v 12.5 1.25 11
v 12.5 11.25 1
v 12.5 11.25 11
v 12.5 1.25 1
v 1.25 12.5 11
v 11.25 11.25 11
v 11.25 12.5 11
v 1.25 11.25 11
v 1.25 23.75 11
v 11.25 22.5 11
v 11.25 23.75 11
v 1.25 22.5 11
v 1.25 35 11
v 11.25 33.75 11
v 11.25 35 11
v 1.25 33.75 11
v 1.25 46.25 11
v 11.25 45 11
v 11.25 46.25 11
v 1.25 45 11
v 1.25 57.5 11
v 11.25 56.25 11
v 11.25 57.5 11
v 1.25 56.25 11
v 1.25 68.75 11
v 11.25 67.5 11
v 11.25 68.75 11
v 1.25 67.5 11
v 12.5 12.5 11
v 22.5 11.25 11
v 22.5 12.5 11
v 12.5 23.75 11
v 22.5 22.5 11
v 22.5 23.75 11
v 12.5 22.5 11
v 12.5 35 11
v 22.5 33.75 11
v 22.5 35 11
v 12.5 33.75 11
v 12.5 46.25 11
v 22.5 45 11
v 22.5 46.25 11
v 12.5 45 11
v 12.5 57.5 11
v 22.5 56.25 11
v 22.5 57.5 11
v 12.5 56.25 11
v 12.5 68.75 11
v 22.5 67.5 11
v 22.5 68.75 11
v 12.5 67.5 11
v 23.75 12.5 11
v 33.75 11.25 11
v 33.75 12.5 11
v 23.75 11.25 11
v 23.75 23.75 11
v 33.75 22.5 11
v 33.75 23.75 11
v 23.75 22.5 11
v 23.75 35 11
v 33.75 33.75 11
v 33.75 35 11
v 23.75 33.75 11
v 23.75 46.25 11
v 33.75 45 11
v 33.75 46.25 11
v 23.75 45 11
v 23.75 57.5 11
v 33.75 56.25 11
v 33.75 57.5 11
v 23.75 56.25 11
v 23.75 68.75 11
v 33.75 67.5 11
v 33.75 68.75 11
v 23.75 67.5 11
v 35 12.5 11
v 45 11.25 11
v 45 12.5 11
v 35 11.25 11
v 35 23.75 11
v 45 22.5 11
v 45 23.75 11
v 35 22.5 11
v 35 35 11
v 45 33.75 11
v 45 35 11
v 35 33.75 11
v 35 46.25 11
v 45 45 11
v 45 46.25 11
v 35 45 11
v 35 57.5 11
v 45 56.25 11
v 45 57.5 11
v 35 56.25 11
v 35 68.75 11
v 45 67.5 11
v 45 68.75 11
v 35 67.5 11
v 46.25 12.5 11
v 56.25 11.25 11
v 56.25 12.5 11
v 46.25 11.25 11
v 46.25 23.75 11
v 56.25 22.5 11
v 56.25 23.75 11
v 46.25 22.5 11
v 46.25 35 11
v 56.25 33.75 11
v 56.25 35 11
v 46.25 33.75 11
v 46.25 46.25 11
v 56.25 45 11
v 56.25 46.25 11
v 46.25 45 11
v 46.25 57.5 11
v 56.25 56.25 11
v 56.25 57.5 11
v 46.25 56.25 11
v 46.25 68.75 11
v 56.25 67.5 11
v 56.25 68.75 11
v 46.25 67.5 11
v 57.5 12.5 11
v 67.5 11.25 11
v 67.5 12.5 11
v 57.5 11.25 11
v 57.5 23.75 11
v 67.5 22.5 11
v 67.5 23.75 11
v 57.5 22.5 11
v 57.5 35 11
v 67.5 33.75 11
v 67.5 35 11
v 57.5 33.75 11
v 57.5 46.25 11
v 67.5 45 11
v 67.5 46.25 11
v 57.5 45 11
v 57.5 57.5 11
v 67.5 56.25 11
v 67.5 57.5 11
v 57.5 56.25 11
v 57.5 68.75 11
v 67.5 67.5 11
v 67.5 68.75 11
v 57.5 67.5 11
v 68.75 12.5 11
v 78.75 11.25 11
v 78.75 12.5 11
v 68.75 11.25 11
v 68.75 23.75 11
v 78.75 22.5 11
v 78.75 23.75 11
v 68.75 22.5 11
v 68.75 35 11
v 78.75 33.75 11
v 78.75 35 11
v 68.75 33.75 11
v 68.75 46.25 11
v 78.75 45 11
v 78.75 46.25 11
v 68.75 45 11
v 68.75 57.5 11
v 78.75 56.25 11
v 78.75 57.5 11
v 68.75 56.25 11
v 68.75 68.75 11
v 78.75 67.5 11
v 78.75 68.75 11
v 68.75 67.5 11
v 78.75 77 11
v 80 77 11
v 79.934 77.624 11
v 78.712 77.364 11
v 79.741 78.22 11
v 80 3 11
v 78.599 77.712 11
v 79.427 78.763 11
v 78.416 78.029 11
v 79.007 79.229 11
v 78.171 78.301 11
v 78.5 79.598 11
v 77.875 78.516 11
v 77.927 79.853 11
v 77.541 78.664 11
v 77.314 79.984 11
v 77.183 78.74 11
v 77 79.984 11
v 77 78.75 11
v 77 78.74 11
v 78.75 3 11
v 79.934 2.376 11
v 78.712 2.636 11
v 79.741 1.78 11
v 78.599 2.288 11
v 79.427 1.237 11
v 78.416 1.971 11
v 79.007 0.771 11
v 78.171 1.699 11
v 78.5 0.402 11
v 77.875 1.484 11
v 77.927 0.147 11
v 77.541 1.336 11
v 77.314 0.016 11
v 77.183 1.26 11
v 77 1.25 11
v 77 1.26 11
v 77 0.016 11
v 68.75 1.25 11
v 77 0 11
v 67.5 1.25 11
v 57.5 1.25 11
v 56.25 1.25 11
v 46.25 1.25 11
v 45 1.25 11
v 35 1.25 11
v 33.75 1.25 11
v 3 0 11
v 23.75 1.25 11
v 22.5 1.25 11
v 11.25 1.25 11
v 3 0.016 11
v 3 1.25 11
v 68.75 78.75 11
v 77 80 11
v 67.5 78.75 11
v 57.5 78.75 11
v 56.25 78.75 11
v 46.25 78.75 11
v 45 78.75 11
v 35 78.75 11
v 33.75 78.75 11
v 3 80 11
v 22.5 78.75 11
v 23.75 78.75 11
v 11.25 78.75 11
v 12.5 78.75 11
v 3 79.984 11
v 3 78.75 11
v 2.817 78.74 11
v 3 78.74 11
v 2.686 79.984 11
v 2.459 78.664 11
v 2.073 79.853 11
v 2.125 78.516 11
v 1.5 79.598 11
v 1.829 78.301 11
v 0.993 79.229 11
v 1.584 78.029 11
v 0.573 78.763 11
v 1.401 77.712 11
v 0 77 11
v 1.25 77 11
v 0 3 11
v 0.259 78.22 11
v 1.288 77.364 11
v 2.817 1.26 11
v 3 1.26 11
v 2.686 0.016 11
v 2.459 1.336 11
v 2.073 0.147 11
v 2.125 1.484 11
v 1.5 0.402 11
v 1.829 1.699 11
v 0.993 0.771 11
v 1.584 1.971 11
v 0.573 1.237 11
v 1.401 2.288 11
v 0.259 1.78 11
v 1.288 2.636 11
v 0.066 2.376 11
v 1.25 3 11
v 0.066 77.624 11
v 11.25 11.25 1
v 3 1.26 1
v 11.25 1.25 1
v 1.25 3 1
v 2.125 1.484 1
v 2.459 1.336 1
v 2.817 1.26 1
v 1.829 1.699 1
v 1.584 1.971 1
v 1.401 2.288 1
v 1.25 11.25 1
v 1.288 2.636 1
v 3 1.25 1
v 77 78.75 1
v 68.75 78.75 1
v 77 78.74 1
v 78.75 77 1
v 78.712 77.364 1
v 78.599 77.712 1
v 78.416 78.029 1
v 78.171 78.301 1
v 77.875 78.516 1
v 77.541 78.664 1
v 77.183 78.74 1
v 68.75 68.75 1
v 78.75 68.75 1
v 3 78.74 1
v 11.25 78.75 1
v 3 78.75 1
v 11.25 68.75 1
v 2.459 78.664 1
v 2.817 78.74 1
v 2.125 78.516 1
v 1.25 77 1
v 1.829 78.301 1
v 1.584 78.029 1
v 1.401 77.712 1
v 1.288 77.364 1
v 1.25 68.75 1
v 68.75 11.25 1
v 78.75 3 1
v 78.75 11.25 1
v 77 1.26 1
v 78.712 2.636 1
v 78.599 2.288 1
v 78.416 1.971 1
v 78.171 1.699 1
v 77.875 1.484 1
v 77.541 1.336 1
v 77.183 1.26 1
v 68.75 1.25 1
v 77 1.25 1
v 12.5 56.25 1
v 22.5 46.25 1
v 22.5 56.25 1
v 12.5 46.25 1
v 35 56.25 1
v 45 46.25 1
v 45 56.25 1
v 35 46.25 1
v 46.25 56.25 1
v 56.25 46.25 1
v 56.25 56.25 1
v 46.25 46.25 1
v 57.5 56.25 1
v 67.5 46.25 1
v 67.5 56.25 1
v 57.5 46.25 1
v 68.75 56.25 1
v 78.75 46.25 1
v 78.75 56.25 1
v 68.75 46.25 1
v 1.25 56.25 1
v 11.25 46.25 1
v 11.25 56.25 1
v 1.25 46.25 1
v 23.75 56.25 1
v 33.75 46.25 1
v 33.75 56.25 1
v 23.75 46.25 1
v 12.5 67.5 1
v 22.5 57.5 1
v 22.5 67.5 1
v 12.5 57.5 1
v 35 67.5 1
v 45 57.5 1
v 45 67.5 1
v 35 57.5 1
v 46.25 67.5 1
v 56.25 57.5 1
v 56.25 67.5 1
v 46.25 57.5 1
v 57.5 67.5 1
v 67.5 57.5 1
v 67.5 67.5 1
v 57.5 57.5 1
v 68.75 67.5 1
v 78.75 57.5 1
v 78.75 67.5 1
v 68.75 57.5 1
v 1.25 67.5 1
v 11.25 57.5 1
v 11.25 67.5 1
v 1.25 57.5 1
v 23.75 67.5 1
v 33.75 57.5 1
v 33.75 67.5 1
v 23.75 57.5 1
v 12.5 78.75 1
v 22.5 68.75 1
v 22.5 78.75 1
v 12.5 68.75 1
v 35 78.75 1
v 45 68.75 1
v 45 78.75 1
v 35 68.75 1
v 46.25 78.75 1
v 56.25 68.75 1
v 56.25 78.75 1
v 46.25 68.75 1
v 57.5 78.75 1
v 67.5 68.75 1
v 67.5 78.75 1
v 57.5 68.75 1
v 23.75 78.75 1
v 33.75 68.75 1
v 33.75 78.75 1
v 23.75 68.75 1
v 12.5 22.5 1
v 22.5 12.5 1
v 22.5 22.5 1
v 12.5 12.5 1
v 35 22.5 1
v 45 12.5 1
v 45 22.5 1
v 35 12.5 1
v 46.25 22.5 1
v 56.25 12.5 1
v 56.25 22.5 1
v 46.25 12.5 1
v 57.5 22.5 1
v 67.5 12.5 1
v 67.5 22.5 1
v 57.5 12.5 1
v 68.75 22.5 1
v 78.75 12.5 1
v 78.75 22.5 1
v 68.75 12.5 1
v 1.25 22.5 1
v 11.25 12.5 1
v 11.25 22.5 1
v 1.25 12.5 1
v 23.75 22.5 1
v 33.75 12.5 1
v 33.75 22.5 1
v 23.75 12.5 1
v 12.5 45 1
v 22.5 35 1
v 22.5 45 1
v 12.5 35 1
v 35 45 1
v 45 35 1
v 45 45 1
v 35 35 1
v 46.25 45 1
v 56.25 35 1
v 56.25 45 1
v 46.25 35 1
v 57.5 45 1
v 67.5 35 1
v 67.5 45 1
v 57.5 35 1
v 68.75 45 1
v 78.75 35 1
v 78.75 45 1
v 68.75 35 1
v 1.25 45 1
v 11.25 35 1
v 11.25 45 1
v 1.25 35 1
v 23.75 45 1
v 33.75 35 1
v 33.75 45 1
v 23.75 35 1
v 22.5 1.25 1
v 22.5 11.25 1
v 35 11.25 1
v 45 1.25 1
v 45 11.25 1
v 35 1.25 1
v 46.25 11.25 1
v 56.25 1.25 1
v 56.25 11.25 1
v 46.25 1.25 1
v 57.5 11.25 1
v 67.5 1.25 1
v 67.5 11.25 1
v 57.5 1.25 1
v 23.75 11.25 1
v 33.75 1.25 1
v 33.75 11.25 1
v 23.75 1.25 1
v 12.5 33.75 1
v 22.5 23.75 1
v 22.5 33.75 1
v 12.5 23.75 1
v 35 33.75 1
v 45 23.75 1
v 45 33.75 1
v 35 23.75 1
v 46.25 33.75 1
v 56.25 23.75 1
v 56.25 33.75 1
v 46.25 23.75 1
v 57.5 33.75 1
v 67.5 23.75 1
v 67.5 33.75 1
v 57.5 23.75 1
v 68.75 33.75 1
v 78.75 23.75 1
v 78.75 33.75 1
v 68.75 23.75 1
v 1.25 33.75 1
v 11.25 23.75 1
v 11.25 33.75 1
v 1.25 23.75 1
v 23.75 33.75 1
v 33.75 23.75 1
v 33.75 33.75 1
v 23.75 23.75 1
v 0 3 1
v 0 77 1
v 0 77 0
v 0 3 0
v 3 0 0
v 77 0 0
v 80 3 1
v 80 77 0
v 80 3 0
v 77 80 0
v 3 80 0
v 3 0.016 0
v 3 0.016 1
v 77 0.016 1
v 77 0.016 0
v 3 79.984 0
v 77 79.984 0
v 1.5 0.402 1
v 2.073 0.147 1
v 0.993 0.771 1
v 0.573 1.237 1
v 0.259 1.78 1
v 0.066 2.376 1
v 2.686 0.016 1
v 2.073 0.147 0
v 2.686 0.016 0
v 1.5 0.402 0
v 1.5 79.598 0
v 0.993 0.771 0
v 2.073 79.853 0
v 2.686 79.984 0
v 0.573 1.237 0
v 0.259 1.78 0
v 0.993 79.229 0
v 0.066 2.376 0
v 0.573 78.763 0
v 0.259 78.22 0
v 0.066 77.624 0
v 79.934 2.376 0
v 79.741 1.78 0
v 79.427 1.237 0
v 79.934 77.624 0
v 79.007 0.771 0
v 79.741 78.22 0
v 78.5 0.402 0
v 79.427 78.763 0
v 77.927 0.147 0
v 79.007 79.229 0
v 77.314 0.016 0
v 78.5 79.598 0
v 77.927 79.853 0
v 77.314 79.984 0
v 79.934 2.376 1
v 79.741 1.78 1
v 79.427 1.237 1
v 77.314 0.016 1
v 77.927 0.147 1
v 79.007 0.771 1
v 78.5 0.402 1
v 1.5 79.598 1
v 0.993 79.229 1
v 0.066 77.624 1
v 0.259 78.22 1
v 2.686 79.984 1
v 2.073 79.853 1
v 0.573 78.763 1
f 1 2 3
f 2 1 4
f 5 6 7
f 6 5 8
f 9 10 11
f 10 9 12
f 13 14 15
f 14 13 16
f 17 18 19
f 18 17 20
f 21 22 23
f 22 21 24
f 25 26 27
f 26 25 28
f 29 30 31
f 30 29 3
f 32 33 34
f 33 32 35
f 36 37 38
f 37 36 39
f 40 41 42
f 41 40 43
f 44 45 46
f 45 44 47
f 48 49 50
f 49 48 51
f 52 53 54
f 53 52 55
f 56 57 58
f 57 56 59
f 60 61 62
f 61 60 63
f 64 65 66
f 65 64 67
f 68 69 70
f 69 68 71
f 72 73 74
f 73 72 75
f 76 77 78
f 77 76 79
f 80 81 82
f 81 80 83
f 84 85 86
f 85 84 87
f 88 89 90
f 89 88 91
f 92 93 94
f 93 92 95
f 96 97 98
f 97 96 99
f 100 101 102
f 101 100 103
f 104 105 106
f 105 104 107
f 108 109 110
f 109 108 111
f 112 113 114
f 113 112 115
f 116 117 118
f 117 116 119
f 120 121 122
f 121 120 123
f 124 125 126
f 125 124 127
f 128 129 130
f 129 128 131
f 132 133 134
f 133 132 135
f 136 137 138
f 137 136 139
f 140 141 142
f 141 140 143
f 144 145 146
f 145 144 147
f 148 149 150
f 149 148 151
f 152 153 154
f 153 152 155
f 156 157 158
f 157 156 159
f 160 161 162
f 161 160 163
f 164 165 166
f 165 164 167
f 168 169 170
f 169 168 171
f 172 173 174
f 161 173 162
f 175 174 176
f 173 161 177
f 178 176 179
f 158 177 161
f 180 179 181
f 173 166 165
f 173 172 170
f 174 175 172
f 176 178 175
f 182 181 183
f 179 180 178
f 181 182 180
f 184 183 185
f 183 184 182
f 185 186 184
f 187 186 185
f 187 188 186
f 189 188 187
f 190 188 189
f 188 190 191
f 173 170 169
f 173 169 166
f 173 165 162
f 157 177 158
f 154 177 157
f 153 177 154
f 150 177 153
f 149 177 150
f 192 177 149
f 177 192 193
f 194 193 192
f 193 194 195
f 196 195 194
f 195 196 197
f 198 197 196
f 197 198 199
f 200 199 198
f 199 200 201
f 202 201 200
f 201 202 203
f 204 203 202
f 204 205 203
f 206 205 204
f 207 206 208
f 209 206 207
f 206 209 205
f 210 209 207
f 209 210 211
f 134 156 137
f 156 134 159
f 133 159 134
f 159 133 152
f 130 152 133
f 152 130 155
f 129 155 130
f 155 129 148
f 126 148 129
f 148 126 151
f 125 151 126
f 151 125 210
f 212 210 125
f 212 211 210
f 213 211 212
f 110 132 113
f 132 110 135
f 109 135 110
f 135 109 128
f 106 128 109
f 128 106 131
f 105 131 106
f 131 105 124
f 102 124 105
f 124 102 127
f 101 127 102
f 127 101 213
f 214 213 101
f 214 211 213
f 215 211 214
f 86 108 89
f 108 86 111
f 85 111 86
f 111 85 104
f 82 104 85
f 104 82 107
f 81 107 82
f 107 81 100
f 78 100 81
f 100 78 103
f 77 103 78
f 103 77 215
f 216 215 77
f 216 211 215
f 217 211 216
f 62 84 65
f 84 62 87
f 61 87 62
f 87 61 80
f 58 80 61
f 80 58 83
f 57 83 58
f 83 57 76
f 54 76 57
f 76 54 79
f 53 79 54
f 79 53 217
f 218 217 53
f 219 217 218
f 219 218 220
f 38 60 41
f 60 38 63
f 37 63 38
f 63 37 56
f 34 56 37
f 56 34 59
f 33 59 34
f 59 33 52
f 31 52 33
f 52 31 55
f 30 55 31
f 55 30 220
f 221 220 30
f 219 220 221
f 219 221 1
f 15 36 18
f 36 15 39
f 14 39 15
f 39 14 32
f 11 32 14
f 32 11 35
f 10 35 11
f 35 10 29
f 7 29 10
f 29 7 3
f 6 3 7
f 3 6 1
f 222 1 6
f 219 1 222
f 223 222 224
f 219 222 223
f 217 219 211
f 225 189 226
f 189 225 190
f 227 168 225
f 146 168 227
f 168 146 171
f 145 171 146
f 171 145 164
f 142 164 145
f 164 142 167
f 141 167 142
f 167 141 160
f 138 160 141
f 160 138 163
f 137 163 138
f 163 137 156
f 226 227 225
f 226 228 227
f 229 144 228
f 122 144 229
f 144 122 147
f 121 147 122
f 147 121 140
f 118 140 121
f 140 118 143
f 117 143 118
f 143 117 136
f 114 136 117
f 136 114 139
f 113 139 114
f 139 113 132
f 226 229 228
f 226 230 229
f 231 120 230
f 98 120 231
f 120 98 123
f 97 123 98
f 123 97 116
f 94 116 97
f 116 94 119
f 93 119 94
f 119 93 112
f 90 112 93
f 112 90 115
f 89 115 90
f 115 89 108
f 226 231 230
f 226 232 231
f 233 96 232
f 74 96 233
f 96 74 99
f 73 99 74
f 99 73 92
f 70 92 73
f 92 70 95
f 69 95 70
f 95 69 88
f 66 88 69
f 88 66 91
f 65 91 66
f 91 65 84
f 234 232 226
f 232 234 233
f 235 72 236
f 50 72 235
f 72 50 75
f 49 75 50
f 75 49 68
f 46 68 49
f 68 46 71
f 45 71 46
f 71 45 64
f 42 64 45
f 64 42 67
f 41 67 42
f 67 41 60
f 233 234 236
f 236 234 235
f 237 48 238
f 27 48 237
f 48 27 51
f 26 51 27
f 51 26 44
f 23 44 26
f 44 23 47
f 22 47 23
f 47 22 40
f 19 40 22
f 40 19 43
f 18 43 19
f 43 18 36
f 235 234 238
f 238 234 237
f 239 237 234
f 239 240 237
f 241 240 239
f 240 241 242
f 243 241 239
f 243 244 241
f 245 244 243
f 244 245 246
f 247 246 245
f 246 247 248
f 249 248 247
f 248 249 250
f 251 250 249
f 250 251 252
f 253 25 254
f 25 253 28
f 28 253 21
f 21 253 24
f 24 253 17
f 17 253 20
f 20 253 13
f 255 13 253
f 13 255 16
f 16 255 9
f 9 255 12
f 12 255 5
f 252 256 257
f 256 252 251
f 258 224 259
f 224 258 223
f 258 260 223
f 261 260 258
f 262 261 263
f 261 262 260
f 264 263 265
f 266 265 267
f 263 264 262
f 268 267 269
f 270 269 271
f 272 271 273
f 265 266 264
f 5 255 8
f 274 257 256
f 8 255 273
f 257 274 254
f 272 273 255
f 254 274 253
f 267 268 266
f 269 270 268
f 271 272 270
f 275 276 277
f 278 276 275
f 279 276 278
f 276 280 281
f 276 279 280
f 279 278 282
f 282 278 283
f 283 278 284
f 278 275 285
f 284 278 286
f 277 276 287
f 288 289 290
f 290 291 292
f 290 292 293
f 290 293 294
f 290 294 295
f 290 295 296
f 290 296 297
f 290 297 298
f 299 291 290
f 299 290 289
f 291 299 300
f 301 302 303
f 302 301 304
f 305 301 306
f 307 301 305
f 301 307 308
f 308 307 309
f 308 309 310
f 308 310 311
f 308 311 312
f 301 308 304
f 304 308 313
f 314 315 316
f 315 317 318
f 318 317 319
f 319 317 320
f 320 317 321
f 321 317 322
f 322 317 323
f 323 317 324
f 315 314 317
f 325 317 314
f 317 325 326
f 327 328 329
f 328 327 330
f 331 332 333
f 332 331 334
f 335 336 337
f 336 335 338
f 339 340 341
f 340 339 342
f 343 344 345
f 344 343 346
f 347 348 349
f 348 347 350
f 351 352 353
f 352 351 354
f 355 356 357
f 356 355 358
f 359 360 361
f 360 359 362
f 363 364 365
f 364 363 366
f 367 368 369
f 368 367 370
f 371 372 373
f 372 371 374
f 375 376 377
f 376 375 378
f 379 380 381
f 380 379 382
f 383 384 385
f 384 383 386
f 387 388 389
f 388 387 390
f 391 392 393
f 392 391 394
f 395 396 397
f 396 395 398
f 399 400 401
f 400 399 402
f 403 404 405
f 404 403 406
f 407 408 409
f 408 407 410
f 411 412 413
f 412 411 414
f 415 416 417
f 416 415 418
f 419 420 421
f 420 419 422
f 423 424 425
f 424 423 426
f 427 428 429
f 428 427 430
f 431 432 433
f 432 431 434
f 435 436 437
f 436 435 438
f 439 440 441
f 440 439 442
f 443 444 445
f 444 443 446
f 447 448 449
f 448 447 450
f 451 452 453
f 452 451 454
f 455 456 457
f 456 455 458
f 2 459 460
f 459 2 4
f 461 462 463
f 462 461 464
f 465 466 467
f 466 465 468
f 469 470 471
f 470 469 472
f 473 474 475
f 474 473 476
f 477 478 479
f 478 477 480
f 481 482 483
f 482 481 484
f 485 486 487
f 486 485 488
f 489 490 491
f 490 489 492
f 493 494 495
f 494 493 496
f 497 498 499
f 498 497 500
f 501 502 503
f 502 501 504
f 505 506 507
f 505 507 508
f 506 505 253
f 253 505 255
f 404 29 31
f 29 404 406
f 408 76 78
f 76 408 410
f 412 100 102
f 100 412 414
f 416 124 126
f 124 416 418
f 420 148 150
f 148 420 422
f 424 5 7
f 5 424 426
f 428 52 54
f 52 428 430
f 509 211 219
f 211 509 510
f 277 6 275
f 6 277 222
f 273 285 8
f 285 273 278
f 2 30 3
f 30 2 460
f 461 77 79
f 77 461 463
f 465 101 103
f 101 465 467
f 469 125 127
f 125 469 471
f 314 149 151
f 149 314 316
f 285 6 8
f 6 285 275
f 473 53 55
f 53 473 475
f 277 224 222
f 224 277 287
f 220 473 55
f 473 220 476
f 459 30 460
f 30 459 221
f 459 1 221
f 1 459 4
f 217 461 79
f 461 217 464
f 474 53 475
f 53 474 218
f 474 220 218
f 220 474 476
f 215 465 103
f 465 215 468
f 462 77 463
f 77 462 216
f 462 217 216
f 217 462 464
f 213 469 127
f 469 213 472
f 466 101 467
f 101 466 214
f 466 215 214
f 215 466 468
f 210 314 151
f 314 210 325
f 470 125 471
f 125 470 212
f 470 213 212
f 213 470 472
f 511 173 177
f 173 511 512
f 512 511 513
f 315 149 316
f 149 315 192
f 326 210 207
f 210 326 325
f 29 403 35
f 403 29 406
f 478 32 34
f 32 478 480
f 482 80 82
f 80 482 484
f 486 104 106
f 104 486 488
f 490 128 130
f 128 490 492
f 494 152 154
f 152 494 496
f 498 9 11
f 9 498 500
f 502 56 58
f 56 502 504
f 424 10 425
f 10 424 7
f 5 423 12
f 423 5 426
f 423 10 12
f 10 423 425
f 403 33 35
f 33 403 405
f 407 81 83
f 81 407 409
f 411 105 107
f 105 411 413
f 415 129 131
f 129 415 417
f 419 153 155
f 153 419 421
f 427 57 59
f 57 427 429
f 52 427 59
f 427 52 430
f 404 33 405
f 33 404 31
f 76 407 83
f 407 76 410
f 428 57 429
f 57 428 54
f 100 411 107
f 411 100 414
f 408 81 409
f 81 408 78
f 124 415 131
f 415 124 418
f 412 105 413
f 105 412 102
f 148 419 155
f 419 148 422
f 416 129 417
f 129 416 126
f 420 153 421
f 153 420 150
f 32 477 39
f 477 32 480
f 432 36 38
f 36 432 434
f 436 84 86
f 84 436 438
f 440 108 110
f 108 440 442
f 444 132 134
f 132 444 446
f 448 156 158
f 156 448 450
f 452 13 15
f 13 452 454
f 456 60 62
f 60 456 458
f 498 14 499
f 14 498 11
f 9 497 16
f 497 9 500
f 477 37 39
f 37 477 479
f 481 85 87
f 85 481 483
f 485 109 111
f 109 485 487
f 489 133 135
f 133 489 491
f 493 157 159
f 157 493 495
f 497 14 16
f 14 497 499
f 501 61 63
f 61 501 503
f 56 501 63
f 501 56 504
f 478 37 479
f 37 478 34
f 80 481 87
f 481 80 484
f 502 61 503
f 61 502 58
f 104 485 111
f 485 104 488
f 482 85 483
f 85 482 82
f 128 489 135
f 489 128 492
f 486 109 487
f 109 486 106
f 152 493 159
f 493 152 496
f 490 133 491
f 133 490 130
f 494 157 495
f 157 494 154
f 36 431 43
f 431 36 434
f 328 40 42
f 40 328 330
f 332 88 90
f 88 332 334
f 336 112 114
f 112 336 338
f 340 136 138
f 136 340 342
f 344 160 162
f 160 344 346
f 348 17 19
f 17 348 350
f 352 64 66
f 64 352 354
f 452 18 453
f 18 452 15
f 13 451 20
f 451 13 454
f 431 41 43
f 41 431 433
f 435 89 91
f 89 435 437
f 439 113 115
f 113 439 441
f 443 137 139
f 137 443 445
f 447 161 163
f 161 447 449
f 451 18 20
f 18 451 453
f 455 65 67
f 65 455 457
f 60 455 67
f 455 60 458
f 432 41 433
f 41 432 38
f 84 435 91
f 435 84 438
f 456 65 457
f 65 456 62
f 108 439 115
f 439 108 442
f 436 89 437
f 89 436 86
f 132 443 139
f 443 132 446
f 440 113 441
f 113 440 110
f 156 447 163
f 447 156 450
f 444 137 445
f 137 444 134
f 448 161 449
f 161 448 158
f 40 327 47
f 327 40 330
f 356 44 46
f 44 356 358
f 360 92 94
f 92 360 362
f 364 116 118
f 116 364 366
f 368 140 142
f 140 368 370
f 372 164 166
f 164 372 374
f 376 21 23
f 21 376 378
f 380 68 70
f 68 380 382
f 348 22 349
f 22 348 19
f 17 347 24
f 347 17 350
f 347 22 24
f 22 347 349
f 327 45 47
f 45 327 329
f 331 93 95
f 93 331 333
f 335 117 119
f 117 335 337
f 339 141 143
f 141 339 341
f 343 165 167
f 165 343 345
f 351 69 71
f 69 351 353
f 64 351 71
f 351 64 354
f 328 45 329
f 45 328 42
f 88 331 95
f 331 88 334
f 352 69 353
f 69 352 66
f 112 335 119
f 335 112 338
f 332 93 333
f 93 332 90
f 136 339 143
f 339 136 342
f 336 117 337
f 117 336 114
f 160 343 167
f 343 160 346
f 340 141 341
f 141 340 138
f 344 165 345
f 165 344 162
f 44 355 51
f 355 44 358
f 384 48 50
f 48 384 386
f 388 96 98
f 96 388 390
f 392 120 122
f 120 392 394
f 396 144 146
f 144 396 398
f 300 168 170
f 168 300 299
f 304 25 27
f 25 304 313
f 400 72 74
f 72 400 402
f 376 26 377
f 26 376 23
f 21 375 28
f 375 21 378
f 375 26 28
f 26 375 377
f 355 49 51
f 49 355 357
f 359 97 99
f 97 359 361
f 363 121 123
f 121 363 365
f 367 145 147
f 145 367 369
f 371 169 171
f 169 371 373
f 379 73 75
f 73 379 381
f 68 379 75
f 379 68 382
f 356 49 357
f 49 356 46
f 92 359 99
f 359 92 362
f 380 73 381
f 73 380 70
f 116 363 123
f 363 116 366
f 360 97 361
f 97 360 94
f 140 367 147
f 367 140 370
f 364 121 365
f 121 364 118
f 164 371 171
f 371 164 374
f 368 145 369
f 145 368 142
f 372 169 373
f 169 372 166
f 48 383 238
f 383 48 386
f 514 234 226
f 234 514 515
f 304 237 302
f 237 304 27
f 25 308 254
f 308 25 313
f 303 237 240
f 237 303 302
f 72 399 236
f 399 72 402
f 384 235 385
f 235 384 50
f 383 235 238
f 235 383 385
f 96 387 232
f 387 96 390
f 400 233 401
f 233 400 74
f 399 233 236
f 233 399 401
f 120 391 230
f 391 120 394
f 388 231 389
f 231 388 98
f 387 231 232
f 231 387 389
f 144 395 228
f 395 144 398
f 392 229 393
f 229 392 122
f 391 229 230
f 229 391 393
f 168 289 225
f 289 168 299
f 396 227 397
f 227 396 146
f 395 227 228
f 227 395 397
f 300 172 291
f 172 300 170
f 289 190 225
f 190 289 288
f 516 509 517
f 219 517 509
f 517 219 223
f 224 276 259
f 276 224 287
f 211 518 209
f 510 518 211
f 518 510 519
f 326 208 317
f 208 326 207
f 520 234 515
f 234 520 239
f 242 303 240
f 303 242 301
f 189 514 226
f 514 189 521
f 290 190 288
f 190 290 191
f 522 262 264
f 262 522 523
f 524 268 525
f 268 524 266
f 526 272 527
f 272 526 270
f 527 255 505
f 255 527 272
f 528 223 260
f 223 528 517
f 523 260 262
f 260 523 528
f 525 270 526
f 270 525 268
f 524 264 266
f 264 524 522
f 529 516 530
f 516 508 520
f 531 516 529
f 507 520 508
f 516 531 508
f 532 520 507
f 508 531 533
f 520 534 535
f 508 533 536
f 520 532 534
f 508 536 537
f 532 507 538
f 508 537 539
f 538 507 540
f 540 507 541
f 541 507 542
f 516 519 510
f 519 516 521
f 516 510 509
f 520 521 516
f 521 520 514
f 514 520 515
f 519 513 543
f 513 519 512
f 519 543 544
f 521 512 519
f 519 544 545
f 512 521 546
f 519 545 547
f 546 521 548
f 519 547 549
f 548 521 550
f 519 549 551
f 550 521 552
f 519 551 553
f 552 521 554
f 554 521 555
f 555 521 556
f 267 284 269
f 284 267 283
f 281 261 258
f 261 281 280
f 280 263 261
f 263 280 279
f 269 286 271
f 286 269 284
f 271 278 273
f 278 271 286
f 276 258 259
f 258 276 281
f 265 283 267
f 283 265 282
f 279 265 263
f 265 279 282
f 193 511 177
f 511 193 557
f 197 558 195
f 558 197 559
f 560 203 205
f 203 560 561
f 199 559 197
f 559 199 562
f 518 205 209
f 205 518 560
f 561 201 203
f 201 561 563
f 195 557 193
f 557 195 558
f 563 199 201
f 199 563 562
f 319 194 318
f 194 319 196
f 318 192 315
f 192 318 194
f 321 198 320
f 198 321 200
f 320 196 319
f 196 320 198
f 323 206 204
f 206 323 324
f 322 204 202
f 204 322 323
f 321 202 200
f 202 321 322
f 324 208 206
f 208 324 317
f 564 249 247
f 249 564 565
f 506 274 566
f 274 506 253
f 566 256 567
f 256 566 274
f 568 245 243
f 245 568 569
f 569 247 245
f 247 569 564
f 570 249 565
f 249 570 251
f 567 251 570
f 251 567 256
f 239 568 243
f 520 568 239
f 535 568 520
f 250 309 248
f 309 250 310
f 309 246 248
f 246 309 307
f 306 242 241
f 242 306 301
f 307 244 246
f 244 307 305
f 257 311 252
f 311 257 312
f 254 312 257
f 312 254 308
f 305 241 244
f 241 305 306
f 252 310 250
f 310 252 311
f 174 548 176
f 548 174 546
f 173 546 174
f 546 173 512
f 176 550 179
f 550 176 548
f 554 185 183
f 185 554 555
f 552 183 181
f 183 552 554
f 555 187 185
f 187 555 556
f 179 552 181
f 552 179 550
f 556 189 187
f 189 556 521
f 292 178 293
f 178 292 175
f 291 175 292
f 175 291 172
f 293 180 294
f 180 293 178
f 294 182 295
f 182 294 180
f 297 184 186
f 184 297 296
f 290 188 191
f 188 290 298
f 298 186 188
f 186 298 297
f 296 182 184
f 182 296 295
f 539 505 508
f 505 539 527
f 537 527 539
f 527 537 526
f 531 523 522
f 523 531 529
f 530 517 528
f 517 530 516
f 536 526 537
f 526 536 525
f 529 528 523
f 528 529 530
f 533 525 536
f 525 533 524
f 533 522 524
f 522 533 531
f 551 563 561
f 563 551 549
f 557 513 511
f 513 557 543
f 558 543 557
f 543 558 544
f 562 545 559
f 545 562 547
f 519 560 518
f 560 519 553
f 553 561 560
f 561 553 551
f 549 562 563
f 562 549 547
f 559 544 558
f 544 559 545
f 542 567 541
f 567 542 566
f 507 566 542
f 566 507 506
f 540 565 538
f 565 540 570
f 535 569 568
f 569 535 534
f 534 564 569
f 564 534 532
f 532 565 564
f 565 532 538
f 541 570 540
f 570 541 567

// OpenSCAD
// all dimensions in millimeters
//How thick each wall is in mm
wall_thickness = 10/8; 
//How tall is the grid?
grid_height=10; 
//side length of pen hole square
square_size=10; 
//How many squares long?
X_squares=7; 
//How many squares Wide?
Y_squares=7;
//rounded corners?, 0 means sharp corners
corner_radius=3; 
//0 means no floor
floor_height = 1; 


//example 1: seen on http://www.thingiverse.com/thing:1294085/#files
//cubistand base.stl
//wall_thickness = 10/8;
//square_size=10;
//X_squares=7;
//Y_squares=7;
//corner_radius=3;
//grid_height=10;
//floor_height = 1;

//example 2: seen on http://www.thingiverse.com/thing:1294085/#files
//cubistand main.stl
//wall_thickness = 10/8;
//square_size=10;
//X_squares=7;
//Y_squares=7;
//corner_radius=3;
//grid_height=10;
//floor_height = 0; //0 means no floor

//example 3: seen on http://www.thingiverse.com/thing:1294085/#files
//cubistand_rod_cap.stl
//wall_thickness = 10/8;
//square_size=10;
//X_squares=1;
//Y_squares=1;
//corner_radius=0;
//grid_height=5;
//floor_height = 1; //0 means no floor


total_height=grid_height+floor_height;
$fn=30; //higher number, smoother curve surface, longer render time

//generation of grid  
translate([0,0,floor_height ])
difference()
{
for (j=[1:Y_squares])
    translate([0,(j-1)*(square_size+wall_thickness),0])
for (i=[1:X_squares])
   translate([(i-1)*(square_size+wall_thickness),0,0])
     difference () {
         cube([square_size+2*wall_thickness,square_size+2*wall_thickness,grid_height]);
         translate([wall_thickness,wall_thickness,0])
            cube([square_size,square_size,grid_height]);

     }

//remove corners   
 cube([corner_radius,corner_radius,grid_height]);  
 
  translate(  [X_squares*(square_size+wall_thickness)-corner_radius+wall_thickness,0,0])
      cube([corner_radius,corner_radius,grid_height]);  
     
  translate(  [0,Y_squares*(square_size+wall_thickness)-corner_radius+wall_thickness,0])
      cube([corner_radius,corner_radius,grid_height]); 

  translate(  [X_squares*(square_size+wall_thickness)-corner_radius+wall_thickness,Y_squares*(square_size+wall_thickness)-corner_radius+wall_thickness,0])
      cube([corner_radius,corner_radius,grid_height]);      
   
 }  
 
 //make rounded corners
 intersection()
 {
  cube([corner_radius,corner_radius,total_height]);    
 translate(  [corner_radius,corner_radius,0])
  difference()
     {    
     cylinder(  total_height,    corner_radius,    corner_radius);  
       cylinder(  total_height,    corner_radius-wall_thickness,    corner_radius-wall_thickness);  
     }
 }
 
 
 intersection()
 {
  cube([corner_radius,corner_radius,total_height]);    
 translate(  [corner_radius,corner_radius,0])
  difference()
     {    
     cylinder(  total_height,    corner_radius,    corner_radius);  
       cylinder(  total_height,    corner_radius-wall_thickness,    corner_radius-wall_thickness);  
     }
 }
 
 
 translate(  [X_squares*(square_size+wall_thickness)-corner_radius+wall_thickness,0,0])
  intersection()
 {
  cube([corner_radius,corner_radius,total_height]);    
 translate(  [0,corner_radius,0])
  difference()
     {    
     cylinder(  total_height,    corner_radius,    corner_radius);  
       cylinder(  total_height,    corner_radius-wall_thickness,    corner_radius-wall_thickness);  
     }
 }
 
translate(  [0,Y_squares*(square_size+wall_thickness)-corner_radius+wall_thickness,0])
  intersection()
 {
  cube([corner_radius,corner_radius,total_height]);    
 translate(  [corner_radius,0,0])
  difference()
     {    
     cylinder(  total_height,    corner_radius,    corner_radius);  
       cylinder(  total_height,    corner_radius-wall_thickness,    corner_radius-wall_thickness);  
     }
 }
 
 translate(  [X_squares*(square_size+wall_thickness)-corner_radius+wall_thickness,Y_squares*(square_size+wall_thickness)-corner_radius+wall_thickness,0])
  intersection()
 {
  cube([corner_radius,corner_radius,total_height]);    
 translate(  [0,0,0])
  difference()
     {    
     cylinder(  total_height,    corner_radius,    corner_radius);  
       cylinder(  total_height,    corner_radius-wall_thickness,    corner_radius-wall_thickness);  
     }
 }
 
 
 //para hacer el suelo, si lo hay (floor_height>1)
 //hago un cubo del tamaño total, de altura -floorheight
 //le quito las esquinas y añado cilindros
 difference()
{
 cube(  [X_squares*(square_size+wall_thickness)+wall_thickness,Y_squares*(square_size+wall_thickness)+wall_thickness, floor_height]);
    
    
    //remove corners   
 cube([corner_radius,corner_radius,floor_height]);  
 
  translate(  [X_squares*(square_size+wall_thickness)-corner_radius+wall_thickness,0,0])
      cube([corner_radius,corner_radius,floor_height]);  
     
  translate(  [0,Y_squares*(square_size+wall_thickness)-corner_radius+wall_thickness,0])
      cube([corner_radius,corner_radius,floor_height]); 

  translate(  [X_squares*(square_size+wall_thickness)-corner_radius+wall_thickness,Y_squares*(square_size+wall_thickness)-corner_radius+wall_thickness,0])
      cube([corner_radius,corner_radius,floor_height]);  
}

//añado cilindros en las esquinas del suelo
// esquina 0,0
translate(  [corner_radius,corner_radius,0])
     cylinder(  floor_height,    corner_radius,    corner_radius);  

//esquina X,0
 translate(  [X_squares*(square_size+wall_thickness)-corner_radius+wall_thickness,corner_radius,0]) 
     cylinder(  floor_height,    corner_radius,    corner_radius);  

//esquina 0,Y 
translate(  [corner_radius,Y_squares*(square_size+wall_thickness)-corner_radius+wall_thickness,0])
     cylinder(  floor_height,    corner_radius,    corner_radius);  
 
 
//esquina X,Y 
 translate(  [X_squares*(square_size+wall_thickness)-corner_radius+wall_thickness,Y_squares*(square_size+wall_thickness)-corner_radius+wall_thickness,0])
     cylinder(  floor_height,    corner_radius,    corner_radius);  
       



